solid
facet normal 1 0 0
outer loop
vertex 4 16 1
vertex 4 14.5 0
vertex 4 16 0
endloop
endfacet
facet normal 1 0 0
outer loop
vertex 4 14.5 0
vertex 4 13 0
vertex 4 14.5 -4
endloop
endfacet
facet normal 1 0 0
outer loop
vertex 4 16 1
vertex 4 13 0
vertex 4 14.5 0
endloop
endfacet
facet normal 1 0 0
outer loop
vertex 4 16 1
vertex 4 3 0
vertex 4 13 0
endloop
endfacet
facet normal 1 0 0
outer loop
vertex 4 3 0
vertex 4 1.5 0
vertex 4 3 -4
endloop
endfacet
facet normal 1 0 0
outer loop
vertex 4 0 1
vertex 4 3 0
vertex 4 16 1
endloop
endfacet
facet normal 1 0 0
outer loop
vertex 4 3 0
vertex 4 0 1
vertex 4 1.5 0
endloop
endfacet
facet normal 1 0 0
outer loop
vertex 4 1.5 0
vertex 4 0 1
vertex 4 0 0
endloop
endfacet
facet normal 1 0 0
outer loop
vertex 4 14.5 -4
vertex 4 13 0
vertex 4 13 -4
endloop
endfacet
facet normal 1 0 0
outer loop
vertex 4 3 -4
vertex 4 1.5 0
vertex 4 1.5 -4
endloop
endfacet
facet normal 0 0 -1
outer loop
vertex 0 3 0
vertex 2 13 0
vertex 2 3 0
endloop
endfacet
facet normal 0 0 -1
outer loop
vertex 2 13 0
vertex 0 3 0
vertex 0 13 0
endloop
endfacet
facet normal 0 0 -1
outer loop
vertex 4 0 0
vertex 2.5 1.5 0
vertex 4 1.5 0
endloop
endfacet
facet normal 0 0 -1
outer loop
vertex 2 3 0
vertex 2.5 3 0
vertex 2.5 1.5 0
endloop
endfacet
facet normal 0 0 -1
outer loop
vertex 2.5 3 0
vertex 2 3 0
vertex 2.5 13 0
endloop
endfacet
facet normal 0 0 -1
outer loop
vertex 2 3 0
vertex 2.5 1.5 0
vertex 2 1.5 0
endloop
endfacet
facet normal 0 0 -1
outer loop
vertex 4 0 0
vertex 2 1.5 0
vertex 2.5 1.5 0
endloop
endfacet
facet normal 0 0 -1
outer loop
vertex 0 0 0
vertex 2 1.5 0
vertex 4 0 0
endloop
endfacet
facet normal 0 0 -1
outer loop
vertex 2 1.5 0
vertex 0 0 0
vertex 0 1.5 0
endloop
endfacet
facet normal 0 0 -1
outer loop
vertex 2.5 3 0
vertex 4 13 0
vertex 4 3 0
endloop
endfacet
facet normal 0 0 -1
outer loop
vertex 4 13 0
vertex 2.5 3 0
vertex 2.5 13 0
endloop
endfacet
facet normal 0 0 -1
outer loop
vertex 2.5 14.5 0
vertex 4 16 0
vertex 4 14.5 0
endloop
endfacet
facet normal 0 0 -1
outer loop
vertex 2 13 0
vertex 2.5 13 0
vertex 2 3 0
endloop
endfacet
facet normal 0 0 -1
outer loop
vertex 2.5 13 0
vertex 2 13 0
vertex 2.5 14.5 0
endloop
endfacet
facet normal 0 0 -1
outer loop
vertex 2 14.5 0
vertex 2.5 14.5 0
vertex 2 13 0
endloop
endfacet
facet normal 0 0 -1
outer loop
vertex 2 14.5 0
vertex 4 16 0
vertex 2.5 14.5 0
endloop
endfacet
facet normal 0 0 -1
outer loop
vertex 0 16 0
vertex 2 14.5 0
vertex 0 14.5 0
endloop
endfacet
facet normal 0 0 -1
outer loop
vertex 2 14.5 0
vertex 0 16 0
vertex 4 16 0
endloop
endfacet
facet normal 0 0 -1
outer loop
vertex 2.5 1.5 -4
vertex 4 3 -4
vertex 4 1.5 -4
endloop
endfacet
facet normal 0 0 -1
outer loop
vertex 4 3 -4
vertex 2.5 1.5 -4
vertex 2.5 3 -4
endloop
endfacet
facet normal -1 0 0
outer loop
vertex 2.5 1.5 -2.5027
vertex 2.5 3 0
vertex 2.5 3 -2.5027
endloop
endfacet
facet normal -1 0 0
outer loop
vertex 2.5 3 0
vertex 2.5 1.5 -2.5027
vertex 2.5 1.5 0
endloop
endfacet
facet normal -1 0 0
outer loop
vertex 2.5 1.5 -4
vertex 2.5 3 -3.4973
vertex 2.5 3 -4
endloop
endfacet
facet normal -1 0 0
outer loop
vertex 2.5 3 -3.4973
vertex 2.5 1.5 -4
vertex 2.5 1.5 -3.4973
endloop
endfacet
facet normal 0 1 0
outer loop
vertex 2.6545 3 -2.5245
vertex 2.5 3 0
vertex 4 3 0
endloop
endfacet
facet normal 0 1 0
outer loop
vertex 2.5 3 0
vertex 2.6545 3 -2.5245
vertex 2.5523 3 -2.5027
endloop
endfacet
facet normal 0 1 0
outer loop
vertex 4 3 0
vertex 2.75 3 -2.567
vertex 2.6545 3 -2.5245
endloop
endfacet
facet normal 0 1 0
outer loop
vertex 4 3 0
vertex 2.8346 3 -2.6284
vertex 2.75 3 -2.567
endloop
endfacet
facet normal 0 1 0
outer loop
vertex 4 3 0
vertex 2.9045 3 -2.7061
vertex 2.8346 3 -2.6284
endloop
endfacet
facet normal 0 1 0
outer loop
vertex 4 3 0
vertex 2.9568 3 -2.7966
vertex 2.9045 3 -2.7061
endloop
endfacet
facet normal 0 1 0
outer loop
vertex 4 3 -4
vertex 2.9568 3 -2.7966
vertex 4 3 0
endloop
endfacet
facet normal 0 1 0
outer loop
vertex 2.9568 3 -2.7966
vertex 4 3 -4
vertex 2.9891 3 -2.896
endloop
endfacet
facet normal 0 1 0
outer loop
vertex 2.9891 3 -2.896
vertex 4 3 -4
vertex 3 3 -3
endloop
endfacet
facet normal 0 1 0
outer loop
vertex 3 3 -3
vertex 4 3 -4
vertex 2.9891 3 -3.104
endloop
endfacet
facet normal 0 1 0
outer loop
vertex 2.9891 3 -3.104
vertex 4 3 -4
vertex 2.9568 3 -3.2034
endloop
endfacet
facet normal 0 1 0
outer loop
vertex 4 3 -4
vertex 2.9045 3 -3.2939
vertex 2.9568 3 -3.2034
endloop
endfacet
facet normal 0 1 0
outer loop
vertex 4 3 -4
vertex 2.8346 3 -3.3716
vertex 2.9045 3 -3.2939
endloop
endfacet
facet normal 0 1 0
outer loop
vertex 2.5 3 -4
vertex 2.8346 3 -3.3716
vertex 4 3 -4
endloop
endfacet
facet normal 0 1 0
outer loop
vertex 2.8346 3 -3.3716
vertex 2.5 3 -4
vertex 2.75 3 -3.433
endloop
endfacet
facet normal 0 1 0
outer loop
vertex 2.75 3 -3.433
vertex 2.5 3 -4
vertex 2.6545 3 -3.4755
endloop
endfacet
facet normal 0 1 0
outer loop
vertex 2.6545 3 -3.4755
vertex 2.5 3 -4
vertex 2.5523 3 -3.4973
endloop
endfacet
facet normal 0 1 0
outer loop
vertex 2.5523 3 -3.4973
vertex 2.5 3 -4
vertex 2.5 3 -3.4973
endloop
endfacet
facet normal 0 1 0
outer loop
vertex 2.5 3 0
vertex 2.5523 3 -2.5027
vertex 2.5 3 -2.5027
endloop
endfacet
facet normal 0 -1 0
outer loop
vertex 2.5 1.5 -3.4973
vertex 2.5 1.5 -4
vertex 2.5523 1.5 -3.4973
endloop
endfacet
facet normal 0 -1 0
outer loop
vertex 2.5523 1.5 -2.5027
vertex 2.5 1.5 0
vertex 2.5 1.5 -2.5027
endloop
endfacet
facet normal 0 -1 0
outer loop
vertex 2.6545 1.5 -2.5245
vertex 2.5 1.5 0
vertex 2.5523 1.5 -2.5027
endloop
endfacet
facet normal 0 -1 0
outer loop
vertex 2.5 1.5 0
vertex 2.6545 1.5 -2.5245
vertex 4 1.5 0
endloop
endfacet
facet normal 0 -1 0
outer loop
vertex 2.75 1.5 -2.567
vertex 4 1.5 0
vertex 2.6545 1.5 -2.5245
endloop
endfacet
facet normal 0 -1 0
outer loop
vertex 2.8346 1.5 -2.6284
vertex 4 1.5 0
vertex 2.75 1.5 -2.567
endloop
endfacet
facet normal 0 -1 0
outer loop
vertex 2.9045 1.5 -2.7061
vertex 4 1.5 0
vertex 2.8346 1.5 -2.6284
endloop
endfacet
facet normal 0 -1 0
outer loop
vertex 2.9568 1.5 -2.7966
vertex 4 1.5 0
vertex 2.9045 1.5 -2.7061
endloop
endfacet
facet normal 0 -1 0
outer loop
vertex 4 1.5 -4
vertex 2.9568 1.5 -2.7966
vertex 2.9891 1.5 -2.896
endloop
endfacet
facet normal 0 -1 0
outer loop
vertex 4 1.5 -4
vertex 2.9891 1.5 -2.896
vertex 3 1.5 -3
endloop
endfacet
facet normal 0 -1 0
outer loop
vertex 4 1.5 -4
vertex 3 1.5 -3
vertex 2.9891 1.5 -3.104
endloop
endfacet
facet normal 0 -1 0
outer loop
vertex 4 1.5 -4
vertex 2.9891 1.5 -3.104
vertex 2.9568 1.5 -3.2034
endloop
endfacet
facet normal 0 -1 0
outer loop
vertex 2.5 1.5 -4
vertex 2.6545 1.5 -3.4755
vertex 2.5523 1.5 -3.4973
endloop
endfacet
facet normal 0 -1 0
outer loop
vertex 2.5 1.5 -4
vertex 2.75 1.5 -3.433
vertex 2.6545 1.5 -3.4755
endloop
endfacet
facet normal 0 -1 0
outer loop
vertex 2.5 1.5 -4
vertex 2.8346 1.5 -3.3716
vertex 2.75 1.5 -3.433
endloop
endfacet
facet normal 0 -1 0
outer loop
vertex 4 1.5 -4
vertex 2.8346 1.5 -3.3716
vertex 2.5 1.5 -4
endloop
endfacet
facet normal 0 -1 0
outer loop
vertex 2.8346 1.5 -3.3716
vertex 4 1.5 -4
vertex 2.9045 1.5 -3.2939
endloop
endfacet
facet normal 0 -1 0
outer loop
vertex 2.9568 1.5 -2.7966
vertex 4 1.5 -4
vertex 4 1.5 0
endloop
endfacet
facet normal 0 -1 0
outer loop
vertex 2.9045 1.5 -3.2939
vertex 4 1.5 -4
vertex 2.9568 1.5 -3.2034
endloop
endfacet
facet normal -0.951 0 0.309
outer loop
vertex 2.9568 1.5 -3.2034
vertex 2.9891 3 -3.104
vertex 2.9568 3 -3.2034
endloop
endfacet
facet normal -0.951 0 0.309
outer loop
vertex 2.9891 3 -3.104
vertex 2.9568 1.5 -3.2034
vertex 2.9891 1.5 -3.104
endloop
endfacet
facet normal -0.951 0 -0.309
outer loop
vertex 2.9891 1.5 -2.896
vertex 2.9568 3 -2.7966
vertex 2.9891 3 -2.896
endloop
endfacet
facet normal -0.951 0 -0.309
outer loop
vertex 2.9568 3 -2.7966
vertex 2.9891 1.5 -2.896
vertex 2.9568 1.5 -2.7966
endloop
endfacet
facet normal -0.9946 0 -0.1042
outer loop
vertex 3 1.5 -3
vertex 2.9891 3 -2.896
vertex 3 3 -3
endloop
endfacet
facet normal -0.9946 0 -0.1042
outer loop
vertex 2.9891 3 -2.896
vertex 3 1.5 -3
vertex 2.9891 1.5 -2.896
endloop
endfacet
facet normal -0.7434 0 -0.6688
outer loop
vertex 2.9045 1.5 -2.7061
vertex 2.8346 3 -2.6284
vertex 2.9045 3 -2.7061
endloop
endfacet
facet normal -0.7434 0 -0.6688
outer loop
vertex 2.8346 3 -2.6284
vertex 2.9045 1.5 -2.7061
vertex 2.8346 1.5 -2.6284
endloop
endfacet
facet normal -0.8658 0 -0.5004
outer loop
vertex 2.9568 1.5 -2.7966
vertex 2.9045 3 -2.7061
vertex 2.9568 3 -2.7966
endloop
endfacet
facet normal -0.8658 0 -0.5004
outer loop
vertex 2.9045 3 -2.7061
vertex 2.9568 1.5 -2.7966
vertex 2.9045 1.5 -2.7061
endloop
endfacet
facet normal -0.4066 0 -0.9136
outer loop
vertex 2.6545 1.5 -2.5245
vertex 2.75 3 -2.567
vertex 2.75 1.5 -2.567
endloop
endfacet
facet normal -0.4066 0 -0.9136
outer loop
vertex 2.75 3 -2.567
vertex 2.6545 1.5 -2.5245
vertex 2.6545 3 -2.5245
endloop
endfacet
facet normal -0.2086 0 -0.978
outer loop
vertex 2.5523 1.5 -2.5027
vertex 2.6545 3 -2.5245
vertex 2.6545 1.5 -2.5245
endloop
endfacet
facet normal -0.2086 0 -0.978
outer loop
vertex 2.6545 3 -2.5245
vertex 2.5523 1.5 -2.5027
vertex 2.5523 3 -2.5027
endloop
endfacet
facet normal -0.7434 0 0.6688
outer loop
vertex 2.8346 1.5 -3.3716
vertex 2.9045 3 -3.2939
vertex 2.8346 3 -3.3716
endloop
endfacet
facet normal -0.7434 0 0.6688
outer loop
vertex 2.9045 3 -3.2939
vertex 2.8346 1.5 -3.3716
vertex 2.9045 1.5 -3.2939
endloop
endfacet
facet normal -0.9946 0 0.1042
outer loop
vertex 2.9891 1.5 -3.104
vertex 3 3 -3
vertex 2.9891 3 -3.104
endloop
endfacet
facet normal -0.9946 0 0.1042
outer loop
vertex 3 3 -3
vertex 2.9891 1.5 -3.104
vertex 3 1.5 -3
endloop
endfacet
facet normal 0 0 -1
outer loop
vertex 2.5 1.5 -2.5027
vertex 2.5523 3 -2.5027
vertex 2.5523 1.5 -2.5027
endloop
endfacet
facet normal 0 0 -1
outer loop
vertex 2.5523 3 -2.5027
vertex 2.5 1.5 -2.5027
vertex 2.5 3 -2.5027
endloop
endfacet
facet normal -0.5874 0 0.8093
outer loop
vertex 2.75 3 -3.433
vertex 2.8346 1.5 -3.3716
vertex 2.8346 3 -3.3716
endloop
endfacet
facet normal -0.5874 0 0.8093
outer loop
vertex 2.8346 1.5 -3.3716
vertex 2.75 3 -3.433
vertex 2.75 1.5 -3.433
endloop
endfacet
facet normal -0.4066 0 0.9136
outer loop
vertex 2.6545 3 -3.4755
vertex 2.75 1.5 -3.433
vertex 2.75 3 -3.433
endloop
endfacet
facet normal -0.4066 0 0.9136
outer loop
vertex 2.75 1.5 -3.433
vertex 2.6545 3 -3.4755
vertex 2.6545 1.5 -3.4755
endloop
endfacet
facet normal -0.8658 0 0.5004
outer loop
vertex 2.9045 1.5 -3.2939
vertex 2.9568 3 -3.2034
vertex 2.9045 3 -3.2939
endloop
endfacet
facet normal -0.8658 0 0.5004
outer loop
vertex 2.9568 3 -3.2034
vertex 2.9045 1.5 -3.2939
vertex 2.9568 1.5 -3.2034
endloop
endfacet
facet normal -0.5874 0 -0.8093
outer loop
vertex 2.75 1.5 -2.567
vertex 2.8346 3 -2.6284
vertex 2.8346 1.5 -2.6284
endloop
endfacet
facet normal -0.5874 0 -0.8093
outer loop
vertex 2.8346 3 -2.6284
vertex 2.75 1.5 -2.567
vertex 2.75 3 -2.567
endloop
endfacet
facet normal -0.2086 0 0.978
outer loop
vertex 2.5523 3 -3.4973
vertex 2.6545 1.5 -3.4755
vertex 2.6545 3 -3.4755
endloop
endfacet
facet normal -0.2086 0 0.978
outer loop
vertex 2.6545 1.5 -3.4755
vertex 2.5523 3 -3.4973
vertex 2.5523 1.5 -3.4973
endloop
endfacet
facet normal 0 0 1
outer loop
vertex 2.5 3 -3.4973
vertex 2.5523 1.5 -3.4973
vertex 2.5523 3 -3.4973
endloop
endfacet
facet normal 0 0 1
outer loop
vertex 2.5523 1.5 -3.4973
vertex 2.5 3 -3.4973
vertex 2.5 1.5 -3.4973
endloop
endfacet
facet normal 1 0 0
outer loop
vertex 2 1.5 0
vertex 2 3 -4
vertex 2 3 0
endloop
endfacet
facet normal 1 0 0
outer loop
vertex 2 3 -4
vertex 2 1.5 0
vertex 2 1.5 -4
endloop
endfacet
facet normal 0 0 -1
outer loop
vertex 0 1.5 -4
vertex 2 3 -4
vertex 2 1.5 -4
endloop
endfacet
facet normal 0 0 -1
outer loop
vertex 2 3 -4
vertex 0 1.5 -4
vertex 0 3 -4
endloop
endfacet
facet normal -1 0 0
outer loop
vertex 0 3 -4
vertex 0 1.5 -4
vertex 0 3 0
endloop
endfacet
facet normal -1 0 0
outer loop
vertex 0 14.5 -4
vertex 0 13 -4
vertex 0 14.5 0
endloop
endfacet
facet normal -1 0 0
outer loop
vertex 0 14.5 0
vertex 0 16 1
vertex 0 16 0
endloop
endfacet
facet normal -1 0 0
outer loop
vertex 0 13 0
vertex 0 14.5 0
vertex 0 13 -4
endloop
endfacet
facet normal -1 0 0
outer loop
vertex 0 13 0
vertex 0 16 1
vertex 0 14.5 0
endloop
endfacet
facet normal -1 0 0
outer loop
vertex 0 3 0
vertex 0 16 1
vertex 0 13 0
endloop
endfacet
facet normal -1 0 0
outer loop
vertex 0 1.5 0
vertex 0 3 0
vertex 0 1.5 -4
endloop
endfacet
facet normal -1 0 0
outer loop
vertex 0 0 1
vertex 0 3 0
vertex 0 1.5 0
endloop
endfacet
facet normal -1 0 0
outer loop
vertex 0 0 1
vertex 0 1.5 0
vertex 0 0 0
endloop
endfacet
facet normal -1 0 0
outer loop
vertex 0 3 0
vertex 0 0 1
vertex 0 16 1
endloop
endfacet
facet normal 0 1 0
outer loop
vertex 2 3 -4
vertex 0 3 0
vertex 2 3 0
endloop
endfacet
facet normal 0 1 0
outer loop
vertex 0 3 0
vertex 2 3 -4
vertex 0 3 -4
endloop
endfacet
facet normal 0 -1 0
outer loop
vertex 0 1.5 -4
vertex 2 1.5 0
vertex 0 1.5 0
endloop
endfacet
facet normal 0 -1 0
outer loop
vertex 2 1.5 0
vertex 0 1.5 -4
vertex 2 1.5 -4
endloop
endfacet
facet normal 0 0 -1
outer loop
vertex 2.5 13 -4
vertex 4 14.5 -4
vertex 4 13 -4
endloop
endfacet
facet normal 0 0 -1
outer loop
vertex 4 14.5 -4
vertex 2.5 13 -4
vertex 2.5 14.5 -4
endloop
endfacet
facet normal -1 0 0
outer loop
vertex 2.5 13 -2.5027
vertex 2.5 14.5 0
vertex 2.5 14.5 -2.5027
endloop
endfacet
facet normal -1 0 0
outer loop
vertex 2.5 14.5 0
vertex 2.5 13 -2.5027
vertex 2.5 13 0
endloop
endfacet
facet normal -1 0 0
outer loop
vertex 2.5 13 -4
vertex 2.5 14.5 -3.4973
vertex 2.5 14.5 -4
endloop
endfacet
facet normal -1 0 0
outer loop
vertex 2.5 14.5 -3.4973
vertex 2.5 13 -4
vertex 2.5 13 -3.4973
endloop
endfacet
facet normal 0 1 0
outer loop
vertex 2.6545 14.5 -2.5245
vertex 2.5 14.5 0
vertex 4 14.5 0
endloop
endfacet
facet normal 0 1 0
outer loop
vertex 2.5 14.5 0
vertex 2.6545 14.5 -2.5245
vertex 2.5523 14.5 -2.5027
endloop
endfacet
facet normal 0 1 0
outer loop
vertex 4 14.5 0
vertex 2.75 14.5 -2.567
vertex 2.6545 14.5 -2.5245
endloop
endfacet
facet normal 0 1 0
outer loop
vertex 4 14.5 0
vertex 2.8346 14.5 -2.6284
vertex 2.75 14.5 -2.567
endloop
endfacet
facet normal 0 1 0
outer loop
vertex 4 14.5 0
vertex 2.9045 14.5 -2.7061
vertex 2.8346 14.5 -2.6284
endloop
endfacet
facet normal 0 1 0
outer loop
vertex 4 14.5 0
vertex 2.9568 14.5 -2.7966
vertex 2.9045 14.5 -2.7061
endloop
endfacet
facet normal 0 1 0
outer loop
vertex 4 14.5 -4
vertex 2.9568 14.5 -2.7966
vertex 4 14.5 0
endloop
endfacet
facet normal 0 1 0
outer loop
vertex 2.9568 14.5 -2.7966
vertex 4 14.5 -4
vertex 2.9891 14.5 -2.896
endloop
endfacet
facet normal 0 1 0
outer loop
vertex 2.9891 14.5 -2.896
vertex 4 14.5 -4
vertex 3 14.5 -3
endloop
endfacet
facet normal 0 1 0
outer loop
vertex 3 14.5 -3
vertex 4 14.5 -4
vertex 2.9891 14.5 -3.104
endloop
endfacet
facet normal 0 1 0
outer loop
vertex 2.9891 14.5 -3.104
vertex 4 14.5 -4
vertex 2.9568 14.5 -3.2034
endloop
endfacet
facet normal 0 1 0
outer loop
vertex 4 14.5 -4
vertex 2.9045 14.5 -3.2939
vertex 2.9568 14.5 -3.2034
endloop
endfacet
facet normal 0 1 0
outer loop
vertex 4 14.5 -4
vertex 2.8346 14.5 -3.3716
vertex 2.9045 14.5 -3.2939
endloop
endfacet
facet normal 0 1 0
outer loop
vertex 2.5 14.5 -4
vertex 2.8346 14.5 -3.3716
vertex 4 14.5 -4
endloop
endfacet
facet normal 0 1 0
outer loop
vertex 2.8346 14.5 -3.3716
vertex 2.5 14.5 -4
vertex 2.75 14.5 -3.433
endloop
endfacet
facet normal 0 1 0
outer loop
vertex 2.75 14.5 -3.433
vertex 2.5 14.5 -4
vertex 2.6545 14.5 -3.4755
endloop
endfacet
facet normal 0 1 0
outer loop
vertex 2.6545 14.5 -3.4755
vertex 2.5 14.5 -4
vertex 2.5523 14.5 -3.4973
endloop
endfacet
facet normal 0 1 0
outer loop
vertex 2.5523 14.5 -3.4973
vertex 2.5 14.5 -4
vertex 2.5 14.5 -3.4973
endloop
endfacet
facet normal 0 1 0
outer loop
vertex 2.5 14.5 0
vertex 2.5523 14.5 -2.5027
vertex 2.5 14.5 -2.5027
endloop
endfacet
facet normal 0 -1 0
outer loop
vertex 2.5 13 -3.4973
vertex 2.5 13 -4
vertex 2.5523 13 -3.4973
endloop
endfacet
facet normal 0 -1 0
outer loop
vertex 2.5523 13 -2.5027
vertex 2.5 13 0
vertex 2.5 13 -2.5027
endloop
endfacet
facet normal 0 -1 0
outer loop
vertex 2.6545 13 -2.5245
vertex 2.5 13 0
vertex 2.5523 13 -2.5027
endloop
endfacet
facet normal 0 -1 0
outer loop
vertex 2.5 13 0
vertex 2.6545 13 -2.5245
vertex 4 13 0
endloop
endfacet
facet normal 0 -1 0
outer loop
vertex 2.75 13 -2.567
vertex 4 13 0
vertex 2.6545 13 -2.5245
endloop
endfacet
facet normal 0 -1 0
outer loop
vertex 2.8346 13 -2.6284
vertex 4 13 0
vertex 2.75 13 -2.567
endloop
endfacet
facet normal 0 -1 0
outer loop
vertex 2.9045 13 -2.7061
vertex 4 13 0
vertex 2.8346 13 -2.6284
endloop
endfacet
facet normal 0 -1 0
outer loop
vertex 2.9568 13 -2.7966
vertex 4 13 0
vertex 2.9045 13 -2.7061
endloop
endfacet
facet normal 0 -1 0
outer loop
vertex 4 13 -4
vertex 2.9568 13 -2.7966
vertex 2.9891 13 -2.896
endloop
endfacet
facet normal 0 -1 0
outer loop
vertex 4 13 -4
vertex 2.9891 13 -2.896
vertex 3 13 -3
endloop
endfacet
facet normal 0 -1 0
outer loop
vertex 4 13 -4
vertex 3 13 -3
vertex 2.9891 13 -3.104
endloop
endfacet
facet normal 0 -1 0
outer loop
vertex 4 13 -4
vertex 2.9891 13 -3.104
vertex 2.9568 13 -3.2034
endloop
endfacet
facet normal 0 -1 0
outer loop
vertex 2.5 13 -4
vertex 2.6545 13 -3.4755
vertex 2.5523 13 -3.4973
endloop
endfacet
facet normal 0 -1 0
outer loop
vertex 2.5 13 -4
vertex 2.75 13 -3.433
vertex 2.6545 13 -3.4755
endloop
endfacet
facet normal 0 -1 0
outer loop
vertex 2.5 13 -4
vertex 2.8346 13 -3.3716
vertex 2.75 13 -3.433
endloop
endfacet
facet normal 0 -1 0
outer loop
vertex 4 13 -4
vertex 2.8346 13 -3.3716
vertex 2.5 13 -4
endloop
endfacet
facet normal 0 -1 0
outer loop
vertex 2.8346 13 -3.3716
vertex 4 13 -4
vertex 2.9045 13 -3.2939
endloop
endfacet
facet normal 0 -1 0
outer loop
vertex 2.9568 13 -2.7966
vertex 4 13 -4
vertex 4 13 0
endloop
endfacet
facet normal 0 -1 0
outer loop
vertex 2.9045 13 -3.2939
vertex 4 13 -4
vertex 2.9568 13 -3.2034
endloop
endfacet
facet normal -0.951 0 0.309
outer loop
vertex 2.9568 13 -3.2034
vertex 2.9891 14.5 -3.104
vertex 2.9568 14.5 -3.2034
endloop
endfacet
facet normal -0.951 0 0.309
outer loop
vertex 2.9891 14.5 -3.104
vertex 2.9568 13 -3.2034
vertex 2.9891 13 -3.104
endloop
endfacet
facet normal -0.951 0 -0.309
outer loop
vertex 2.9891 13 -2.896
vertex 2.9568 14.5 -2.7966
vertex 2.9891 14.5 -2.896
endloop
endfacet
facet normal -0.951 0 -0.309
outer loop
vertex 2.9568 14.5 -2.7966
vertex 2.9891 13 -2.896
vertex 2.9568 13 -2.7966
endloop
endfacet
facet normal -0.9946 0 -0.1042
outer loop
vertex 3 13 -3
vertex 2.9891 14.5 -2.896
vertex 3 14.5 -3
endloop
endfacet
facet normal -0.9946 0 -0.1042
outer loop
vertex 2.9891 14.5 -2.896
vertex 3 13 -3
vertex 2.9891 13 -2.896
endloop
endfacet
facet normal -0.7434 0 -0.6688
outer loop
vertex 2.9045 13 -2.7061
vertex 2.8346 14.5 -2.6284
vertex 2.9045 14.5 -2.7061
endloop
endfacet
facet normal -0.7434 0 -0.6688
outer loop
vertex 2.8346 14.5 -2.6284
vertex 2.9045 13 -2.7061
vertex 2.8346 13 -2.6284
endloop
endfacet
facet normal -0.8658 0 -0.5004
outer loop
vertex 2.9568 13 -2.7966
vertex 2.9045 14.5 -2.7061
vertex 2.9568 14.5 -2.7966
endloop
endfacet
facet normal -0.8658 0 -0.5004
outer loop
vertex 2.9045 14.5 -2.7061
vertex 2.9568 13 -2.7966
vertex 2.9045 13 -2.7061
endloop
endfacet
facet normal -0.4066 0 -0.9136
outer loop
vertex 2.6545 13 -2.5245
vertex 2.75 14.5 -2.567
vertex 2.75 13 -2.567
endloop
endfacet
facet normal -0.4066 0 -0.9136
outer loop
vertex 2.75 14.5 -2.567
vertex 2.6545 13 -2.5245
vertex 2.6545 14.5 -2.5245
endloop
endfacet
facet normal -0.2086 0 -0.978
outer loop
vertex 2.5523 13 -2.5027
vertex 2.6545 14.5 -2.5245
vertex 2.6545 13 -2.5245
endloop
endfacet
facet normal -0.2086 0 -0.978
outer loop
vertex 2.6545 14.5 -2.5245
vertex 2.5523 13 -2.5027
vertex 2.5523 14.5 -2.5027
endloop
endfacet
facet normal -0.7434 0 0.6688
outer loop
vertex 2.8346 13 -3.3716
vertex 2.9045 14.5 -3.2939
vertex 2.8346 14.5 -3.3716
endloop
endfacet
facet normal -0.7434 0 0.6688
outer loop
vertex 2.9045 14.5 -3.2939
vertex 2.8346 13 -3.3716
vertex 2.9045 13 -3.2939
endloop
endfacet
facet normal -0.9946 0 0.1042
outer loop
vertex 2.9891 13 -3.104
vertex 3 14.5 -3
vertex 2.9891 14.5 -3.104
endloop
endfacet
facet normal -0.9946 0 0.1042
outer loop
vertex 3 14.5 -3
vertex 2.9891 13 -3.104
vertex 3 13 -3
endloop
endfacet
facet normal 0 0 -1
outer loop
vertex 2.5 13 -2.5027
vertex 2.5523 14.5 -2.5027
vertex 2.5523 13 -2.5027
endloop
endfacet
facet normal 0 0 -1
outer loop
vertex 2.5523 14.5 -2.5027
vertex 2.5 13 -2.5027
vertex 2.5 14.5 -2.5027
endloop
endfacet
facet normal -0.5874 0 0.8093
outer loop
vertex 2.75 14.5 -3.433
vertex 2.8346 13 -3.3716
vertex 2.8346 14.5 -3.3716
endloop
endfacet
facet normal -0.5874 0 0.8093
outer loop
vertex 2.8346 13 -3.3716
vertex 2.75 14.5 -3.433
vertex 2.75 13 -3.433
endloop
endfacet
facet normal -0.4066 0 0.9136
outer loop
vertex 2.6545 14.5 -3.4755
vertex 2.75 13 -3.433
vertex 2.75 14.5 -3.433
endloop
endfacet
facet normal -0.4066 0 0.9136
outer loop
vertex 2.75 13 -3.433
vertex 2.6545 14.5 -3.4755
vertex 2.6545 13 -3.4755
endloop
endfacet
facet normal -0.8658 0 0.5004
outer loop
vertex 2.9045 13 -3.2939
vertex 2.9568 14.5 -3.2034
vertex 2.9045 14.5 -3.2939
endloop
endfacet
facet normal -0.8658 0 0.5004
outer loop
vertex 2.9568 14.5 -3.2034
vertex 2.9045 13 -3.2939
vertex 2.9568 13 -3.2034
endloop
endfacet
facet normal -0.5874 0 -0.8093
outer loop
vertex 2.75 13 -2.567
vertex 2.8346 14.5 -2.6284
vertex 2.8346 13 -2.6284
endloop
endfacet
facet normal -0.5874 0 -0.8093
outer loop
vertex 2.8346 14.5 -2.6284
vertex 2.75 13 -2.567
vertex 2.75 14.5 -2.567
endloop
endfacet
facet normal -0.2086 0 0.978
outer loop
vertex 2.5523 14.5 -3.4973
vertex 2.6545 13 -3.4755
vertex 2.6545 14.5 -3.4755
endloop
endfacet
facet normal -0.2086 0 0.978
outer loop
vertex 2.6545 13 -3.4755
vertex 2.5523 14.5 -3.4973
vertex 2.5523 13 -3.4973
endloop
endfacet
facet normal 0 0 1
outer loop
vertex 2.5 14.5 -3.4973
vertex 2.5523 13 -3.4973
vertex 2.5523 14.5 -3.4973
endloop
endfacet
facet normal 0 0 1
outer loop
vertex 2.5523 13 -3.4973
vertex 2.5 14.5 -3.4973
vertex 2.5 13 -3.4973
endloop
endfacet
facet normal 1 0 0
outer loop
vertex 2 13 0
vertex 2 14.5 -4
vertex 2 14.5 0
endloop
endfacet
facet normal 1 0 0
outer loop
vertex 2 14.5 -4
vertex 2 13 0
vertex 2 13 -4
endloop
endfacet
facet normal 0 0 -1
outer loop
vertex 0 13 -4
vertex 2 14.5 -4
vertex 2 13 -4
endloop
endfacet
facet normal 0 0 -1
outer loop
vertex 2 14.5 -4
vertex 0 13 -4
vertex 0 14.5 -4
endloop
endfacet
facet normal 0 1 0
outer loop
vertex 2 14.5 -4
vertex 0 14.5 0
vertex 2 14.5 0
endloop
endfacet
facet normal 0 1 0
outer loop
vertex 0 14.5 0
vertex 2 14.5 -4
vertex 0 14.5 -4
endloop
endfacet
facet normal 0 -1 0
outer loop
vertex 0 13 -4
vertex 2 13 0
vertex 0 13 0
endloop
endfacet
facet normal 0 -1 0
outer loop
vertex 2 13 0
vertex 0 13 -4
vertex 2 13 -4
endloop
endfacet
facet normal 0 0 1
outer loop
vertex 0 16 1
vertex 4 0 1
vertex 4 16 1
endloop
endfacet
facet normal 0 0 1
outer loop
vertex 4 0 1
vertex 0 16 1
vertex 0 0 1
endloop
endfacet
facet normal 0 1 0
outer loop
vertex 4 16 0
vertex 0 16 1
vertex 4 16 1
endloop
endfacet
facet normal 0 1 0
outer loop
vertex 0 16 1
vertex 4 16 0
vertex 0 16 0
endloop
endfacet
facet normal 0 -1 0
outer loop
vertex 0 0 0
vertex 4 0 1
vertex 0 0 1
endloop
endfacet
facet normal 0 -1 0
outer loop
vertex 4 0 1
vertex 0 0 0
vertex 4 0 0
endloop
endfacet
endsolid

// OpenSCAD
$fn=30;
module clips(){
    module pegs() {
        cube([2,1.5,4]);
        translate([2.5,0,0]){
            difference(){
                cube([1.5,1.5,4]);
                translate([0,0,-3]){
                    rotate([90,0,0]){
                        translate([0,4,-2]){
                            cylinder(h=2.5, r=0.5);
                        }
                    }
                }
            }
        }
    }
    cube([4,16,1]);
    translate([0,1.5,-4]){
       pegs();
    }
    translate([0,13,-4]){
       pegs();
    }
}
clips();
